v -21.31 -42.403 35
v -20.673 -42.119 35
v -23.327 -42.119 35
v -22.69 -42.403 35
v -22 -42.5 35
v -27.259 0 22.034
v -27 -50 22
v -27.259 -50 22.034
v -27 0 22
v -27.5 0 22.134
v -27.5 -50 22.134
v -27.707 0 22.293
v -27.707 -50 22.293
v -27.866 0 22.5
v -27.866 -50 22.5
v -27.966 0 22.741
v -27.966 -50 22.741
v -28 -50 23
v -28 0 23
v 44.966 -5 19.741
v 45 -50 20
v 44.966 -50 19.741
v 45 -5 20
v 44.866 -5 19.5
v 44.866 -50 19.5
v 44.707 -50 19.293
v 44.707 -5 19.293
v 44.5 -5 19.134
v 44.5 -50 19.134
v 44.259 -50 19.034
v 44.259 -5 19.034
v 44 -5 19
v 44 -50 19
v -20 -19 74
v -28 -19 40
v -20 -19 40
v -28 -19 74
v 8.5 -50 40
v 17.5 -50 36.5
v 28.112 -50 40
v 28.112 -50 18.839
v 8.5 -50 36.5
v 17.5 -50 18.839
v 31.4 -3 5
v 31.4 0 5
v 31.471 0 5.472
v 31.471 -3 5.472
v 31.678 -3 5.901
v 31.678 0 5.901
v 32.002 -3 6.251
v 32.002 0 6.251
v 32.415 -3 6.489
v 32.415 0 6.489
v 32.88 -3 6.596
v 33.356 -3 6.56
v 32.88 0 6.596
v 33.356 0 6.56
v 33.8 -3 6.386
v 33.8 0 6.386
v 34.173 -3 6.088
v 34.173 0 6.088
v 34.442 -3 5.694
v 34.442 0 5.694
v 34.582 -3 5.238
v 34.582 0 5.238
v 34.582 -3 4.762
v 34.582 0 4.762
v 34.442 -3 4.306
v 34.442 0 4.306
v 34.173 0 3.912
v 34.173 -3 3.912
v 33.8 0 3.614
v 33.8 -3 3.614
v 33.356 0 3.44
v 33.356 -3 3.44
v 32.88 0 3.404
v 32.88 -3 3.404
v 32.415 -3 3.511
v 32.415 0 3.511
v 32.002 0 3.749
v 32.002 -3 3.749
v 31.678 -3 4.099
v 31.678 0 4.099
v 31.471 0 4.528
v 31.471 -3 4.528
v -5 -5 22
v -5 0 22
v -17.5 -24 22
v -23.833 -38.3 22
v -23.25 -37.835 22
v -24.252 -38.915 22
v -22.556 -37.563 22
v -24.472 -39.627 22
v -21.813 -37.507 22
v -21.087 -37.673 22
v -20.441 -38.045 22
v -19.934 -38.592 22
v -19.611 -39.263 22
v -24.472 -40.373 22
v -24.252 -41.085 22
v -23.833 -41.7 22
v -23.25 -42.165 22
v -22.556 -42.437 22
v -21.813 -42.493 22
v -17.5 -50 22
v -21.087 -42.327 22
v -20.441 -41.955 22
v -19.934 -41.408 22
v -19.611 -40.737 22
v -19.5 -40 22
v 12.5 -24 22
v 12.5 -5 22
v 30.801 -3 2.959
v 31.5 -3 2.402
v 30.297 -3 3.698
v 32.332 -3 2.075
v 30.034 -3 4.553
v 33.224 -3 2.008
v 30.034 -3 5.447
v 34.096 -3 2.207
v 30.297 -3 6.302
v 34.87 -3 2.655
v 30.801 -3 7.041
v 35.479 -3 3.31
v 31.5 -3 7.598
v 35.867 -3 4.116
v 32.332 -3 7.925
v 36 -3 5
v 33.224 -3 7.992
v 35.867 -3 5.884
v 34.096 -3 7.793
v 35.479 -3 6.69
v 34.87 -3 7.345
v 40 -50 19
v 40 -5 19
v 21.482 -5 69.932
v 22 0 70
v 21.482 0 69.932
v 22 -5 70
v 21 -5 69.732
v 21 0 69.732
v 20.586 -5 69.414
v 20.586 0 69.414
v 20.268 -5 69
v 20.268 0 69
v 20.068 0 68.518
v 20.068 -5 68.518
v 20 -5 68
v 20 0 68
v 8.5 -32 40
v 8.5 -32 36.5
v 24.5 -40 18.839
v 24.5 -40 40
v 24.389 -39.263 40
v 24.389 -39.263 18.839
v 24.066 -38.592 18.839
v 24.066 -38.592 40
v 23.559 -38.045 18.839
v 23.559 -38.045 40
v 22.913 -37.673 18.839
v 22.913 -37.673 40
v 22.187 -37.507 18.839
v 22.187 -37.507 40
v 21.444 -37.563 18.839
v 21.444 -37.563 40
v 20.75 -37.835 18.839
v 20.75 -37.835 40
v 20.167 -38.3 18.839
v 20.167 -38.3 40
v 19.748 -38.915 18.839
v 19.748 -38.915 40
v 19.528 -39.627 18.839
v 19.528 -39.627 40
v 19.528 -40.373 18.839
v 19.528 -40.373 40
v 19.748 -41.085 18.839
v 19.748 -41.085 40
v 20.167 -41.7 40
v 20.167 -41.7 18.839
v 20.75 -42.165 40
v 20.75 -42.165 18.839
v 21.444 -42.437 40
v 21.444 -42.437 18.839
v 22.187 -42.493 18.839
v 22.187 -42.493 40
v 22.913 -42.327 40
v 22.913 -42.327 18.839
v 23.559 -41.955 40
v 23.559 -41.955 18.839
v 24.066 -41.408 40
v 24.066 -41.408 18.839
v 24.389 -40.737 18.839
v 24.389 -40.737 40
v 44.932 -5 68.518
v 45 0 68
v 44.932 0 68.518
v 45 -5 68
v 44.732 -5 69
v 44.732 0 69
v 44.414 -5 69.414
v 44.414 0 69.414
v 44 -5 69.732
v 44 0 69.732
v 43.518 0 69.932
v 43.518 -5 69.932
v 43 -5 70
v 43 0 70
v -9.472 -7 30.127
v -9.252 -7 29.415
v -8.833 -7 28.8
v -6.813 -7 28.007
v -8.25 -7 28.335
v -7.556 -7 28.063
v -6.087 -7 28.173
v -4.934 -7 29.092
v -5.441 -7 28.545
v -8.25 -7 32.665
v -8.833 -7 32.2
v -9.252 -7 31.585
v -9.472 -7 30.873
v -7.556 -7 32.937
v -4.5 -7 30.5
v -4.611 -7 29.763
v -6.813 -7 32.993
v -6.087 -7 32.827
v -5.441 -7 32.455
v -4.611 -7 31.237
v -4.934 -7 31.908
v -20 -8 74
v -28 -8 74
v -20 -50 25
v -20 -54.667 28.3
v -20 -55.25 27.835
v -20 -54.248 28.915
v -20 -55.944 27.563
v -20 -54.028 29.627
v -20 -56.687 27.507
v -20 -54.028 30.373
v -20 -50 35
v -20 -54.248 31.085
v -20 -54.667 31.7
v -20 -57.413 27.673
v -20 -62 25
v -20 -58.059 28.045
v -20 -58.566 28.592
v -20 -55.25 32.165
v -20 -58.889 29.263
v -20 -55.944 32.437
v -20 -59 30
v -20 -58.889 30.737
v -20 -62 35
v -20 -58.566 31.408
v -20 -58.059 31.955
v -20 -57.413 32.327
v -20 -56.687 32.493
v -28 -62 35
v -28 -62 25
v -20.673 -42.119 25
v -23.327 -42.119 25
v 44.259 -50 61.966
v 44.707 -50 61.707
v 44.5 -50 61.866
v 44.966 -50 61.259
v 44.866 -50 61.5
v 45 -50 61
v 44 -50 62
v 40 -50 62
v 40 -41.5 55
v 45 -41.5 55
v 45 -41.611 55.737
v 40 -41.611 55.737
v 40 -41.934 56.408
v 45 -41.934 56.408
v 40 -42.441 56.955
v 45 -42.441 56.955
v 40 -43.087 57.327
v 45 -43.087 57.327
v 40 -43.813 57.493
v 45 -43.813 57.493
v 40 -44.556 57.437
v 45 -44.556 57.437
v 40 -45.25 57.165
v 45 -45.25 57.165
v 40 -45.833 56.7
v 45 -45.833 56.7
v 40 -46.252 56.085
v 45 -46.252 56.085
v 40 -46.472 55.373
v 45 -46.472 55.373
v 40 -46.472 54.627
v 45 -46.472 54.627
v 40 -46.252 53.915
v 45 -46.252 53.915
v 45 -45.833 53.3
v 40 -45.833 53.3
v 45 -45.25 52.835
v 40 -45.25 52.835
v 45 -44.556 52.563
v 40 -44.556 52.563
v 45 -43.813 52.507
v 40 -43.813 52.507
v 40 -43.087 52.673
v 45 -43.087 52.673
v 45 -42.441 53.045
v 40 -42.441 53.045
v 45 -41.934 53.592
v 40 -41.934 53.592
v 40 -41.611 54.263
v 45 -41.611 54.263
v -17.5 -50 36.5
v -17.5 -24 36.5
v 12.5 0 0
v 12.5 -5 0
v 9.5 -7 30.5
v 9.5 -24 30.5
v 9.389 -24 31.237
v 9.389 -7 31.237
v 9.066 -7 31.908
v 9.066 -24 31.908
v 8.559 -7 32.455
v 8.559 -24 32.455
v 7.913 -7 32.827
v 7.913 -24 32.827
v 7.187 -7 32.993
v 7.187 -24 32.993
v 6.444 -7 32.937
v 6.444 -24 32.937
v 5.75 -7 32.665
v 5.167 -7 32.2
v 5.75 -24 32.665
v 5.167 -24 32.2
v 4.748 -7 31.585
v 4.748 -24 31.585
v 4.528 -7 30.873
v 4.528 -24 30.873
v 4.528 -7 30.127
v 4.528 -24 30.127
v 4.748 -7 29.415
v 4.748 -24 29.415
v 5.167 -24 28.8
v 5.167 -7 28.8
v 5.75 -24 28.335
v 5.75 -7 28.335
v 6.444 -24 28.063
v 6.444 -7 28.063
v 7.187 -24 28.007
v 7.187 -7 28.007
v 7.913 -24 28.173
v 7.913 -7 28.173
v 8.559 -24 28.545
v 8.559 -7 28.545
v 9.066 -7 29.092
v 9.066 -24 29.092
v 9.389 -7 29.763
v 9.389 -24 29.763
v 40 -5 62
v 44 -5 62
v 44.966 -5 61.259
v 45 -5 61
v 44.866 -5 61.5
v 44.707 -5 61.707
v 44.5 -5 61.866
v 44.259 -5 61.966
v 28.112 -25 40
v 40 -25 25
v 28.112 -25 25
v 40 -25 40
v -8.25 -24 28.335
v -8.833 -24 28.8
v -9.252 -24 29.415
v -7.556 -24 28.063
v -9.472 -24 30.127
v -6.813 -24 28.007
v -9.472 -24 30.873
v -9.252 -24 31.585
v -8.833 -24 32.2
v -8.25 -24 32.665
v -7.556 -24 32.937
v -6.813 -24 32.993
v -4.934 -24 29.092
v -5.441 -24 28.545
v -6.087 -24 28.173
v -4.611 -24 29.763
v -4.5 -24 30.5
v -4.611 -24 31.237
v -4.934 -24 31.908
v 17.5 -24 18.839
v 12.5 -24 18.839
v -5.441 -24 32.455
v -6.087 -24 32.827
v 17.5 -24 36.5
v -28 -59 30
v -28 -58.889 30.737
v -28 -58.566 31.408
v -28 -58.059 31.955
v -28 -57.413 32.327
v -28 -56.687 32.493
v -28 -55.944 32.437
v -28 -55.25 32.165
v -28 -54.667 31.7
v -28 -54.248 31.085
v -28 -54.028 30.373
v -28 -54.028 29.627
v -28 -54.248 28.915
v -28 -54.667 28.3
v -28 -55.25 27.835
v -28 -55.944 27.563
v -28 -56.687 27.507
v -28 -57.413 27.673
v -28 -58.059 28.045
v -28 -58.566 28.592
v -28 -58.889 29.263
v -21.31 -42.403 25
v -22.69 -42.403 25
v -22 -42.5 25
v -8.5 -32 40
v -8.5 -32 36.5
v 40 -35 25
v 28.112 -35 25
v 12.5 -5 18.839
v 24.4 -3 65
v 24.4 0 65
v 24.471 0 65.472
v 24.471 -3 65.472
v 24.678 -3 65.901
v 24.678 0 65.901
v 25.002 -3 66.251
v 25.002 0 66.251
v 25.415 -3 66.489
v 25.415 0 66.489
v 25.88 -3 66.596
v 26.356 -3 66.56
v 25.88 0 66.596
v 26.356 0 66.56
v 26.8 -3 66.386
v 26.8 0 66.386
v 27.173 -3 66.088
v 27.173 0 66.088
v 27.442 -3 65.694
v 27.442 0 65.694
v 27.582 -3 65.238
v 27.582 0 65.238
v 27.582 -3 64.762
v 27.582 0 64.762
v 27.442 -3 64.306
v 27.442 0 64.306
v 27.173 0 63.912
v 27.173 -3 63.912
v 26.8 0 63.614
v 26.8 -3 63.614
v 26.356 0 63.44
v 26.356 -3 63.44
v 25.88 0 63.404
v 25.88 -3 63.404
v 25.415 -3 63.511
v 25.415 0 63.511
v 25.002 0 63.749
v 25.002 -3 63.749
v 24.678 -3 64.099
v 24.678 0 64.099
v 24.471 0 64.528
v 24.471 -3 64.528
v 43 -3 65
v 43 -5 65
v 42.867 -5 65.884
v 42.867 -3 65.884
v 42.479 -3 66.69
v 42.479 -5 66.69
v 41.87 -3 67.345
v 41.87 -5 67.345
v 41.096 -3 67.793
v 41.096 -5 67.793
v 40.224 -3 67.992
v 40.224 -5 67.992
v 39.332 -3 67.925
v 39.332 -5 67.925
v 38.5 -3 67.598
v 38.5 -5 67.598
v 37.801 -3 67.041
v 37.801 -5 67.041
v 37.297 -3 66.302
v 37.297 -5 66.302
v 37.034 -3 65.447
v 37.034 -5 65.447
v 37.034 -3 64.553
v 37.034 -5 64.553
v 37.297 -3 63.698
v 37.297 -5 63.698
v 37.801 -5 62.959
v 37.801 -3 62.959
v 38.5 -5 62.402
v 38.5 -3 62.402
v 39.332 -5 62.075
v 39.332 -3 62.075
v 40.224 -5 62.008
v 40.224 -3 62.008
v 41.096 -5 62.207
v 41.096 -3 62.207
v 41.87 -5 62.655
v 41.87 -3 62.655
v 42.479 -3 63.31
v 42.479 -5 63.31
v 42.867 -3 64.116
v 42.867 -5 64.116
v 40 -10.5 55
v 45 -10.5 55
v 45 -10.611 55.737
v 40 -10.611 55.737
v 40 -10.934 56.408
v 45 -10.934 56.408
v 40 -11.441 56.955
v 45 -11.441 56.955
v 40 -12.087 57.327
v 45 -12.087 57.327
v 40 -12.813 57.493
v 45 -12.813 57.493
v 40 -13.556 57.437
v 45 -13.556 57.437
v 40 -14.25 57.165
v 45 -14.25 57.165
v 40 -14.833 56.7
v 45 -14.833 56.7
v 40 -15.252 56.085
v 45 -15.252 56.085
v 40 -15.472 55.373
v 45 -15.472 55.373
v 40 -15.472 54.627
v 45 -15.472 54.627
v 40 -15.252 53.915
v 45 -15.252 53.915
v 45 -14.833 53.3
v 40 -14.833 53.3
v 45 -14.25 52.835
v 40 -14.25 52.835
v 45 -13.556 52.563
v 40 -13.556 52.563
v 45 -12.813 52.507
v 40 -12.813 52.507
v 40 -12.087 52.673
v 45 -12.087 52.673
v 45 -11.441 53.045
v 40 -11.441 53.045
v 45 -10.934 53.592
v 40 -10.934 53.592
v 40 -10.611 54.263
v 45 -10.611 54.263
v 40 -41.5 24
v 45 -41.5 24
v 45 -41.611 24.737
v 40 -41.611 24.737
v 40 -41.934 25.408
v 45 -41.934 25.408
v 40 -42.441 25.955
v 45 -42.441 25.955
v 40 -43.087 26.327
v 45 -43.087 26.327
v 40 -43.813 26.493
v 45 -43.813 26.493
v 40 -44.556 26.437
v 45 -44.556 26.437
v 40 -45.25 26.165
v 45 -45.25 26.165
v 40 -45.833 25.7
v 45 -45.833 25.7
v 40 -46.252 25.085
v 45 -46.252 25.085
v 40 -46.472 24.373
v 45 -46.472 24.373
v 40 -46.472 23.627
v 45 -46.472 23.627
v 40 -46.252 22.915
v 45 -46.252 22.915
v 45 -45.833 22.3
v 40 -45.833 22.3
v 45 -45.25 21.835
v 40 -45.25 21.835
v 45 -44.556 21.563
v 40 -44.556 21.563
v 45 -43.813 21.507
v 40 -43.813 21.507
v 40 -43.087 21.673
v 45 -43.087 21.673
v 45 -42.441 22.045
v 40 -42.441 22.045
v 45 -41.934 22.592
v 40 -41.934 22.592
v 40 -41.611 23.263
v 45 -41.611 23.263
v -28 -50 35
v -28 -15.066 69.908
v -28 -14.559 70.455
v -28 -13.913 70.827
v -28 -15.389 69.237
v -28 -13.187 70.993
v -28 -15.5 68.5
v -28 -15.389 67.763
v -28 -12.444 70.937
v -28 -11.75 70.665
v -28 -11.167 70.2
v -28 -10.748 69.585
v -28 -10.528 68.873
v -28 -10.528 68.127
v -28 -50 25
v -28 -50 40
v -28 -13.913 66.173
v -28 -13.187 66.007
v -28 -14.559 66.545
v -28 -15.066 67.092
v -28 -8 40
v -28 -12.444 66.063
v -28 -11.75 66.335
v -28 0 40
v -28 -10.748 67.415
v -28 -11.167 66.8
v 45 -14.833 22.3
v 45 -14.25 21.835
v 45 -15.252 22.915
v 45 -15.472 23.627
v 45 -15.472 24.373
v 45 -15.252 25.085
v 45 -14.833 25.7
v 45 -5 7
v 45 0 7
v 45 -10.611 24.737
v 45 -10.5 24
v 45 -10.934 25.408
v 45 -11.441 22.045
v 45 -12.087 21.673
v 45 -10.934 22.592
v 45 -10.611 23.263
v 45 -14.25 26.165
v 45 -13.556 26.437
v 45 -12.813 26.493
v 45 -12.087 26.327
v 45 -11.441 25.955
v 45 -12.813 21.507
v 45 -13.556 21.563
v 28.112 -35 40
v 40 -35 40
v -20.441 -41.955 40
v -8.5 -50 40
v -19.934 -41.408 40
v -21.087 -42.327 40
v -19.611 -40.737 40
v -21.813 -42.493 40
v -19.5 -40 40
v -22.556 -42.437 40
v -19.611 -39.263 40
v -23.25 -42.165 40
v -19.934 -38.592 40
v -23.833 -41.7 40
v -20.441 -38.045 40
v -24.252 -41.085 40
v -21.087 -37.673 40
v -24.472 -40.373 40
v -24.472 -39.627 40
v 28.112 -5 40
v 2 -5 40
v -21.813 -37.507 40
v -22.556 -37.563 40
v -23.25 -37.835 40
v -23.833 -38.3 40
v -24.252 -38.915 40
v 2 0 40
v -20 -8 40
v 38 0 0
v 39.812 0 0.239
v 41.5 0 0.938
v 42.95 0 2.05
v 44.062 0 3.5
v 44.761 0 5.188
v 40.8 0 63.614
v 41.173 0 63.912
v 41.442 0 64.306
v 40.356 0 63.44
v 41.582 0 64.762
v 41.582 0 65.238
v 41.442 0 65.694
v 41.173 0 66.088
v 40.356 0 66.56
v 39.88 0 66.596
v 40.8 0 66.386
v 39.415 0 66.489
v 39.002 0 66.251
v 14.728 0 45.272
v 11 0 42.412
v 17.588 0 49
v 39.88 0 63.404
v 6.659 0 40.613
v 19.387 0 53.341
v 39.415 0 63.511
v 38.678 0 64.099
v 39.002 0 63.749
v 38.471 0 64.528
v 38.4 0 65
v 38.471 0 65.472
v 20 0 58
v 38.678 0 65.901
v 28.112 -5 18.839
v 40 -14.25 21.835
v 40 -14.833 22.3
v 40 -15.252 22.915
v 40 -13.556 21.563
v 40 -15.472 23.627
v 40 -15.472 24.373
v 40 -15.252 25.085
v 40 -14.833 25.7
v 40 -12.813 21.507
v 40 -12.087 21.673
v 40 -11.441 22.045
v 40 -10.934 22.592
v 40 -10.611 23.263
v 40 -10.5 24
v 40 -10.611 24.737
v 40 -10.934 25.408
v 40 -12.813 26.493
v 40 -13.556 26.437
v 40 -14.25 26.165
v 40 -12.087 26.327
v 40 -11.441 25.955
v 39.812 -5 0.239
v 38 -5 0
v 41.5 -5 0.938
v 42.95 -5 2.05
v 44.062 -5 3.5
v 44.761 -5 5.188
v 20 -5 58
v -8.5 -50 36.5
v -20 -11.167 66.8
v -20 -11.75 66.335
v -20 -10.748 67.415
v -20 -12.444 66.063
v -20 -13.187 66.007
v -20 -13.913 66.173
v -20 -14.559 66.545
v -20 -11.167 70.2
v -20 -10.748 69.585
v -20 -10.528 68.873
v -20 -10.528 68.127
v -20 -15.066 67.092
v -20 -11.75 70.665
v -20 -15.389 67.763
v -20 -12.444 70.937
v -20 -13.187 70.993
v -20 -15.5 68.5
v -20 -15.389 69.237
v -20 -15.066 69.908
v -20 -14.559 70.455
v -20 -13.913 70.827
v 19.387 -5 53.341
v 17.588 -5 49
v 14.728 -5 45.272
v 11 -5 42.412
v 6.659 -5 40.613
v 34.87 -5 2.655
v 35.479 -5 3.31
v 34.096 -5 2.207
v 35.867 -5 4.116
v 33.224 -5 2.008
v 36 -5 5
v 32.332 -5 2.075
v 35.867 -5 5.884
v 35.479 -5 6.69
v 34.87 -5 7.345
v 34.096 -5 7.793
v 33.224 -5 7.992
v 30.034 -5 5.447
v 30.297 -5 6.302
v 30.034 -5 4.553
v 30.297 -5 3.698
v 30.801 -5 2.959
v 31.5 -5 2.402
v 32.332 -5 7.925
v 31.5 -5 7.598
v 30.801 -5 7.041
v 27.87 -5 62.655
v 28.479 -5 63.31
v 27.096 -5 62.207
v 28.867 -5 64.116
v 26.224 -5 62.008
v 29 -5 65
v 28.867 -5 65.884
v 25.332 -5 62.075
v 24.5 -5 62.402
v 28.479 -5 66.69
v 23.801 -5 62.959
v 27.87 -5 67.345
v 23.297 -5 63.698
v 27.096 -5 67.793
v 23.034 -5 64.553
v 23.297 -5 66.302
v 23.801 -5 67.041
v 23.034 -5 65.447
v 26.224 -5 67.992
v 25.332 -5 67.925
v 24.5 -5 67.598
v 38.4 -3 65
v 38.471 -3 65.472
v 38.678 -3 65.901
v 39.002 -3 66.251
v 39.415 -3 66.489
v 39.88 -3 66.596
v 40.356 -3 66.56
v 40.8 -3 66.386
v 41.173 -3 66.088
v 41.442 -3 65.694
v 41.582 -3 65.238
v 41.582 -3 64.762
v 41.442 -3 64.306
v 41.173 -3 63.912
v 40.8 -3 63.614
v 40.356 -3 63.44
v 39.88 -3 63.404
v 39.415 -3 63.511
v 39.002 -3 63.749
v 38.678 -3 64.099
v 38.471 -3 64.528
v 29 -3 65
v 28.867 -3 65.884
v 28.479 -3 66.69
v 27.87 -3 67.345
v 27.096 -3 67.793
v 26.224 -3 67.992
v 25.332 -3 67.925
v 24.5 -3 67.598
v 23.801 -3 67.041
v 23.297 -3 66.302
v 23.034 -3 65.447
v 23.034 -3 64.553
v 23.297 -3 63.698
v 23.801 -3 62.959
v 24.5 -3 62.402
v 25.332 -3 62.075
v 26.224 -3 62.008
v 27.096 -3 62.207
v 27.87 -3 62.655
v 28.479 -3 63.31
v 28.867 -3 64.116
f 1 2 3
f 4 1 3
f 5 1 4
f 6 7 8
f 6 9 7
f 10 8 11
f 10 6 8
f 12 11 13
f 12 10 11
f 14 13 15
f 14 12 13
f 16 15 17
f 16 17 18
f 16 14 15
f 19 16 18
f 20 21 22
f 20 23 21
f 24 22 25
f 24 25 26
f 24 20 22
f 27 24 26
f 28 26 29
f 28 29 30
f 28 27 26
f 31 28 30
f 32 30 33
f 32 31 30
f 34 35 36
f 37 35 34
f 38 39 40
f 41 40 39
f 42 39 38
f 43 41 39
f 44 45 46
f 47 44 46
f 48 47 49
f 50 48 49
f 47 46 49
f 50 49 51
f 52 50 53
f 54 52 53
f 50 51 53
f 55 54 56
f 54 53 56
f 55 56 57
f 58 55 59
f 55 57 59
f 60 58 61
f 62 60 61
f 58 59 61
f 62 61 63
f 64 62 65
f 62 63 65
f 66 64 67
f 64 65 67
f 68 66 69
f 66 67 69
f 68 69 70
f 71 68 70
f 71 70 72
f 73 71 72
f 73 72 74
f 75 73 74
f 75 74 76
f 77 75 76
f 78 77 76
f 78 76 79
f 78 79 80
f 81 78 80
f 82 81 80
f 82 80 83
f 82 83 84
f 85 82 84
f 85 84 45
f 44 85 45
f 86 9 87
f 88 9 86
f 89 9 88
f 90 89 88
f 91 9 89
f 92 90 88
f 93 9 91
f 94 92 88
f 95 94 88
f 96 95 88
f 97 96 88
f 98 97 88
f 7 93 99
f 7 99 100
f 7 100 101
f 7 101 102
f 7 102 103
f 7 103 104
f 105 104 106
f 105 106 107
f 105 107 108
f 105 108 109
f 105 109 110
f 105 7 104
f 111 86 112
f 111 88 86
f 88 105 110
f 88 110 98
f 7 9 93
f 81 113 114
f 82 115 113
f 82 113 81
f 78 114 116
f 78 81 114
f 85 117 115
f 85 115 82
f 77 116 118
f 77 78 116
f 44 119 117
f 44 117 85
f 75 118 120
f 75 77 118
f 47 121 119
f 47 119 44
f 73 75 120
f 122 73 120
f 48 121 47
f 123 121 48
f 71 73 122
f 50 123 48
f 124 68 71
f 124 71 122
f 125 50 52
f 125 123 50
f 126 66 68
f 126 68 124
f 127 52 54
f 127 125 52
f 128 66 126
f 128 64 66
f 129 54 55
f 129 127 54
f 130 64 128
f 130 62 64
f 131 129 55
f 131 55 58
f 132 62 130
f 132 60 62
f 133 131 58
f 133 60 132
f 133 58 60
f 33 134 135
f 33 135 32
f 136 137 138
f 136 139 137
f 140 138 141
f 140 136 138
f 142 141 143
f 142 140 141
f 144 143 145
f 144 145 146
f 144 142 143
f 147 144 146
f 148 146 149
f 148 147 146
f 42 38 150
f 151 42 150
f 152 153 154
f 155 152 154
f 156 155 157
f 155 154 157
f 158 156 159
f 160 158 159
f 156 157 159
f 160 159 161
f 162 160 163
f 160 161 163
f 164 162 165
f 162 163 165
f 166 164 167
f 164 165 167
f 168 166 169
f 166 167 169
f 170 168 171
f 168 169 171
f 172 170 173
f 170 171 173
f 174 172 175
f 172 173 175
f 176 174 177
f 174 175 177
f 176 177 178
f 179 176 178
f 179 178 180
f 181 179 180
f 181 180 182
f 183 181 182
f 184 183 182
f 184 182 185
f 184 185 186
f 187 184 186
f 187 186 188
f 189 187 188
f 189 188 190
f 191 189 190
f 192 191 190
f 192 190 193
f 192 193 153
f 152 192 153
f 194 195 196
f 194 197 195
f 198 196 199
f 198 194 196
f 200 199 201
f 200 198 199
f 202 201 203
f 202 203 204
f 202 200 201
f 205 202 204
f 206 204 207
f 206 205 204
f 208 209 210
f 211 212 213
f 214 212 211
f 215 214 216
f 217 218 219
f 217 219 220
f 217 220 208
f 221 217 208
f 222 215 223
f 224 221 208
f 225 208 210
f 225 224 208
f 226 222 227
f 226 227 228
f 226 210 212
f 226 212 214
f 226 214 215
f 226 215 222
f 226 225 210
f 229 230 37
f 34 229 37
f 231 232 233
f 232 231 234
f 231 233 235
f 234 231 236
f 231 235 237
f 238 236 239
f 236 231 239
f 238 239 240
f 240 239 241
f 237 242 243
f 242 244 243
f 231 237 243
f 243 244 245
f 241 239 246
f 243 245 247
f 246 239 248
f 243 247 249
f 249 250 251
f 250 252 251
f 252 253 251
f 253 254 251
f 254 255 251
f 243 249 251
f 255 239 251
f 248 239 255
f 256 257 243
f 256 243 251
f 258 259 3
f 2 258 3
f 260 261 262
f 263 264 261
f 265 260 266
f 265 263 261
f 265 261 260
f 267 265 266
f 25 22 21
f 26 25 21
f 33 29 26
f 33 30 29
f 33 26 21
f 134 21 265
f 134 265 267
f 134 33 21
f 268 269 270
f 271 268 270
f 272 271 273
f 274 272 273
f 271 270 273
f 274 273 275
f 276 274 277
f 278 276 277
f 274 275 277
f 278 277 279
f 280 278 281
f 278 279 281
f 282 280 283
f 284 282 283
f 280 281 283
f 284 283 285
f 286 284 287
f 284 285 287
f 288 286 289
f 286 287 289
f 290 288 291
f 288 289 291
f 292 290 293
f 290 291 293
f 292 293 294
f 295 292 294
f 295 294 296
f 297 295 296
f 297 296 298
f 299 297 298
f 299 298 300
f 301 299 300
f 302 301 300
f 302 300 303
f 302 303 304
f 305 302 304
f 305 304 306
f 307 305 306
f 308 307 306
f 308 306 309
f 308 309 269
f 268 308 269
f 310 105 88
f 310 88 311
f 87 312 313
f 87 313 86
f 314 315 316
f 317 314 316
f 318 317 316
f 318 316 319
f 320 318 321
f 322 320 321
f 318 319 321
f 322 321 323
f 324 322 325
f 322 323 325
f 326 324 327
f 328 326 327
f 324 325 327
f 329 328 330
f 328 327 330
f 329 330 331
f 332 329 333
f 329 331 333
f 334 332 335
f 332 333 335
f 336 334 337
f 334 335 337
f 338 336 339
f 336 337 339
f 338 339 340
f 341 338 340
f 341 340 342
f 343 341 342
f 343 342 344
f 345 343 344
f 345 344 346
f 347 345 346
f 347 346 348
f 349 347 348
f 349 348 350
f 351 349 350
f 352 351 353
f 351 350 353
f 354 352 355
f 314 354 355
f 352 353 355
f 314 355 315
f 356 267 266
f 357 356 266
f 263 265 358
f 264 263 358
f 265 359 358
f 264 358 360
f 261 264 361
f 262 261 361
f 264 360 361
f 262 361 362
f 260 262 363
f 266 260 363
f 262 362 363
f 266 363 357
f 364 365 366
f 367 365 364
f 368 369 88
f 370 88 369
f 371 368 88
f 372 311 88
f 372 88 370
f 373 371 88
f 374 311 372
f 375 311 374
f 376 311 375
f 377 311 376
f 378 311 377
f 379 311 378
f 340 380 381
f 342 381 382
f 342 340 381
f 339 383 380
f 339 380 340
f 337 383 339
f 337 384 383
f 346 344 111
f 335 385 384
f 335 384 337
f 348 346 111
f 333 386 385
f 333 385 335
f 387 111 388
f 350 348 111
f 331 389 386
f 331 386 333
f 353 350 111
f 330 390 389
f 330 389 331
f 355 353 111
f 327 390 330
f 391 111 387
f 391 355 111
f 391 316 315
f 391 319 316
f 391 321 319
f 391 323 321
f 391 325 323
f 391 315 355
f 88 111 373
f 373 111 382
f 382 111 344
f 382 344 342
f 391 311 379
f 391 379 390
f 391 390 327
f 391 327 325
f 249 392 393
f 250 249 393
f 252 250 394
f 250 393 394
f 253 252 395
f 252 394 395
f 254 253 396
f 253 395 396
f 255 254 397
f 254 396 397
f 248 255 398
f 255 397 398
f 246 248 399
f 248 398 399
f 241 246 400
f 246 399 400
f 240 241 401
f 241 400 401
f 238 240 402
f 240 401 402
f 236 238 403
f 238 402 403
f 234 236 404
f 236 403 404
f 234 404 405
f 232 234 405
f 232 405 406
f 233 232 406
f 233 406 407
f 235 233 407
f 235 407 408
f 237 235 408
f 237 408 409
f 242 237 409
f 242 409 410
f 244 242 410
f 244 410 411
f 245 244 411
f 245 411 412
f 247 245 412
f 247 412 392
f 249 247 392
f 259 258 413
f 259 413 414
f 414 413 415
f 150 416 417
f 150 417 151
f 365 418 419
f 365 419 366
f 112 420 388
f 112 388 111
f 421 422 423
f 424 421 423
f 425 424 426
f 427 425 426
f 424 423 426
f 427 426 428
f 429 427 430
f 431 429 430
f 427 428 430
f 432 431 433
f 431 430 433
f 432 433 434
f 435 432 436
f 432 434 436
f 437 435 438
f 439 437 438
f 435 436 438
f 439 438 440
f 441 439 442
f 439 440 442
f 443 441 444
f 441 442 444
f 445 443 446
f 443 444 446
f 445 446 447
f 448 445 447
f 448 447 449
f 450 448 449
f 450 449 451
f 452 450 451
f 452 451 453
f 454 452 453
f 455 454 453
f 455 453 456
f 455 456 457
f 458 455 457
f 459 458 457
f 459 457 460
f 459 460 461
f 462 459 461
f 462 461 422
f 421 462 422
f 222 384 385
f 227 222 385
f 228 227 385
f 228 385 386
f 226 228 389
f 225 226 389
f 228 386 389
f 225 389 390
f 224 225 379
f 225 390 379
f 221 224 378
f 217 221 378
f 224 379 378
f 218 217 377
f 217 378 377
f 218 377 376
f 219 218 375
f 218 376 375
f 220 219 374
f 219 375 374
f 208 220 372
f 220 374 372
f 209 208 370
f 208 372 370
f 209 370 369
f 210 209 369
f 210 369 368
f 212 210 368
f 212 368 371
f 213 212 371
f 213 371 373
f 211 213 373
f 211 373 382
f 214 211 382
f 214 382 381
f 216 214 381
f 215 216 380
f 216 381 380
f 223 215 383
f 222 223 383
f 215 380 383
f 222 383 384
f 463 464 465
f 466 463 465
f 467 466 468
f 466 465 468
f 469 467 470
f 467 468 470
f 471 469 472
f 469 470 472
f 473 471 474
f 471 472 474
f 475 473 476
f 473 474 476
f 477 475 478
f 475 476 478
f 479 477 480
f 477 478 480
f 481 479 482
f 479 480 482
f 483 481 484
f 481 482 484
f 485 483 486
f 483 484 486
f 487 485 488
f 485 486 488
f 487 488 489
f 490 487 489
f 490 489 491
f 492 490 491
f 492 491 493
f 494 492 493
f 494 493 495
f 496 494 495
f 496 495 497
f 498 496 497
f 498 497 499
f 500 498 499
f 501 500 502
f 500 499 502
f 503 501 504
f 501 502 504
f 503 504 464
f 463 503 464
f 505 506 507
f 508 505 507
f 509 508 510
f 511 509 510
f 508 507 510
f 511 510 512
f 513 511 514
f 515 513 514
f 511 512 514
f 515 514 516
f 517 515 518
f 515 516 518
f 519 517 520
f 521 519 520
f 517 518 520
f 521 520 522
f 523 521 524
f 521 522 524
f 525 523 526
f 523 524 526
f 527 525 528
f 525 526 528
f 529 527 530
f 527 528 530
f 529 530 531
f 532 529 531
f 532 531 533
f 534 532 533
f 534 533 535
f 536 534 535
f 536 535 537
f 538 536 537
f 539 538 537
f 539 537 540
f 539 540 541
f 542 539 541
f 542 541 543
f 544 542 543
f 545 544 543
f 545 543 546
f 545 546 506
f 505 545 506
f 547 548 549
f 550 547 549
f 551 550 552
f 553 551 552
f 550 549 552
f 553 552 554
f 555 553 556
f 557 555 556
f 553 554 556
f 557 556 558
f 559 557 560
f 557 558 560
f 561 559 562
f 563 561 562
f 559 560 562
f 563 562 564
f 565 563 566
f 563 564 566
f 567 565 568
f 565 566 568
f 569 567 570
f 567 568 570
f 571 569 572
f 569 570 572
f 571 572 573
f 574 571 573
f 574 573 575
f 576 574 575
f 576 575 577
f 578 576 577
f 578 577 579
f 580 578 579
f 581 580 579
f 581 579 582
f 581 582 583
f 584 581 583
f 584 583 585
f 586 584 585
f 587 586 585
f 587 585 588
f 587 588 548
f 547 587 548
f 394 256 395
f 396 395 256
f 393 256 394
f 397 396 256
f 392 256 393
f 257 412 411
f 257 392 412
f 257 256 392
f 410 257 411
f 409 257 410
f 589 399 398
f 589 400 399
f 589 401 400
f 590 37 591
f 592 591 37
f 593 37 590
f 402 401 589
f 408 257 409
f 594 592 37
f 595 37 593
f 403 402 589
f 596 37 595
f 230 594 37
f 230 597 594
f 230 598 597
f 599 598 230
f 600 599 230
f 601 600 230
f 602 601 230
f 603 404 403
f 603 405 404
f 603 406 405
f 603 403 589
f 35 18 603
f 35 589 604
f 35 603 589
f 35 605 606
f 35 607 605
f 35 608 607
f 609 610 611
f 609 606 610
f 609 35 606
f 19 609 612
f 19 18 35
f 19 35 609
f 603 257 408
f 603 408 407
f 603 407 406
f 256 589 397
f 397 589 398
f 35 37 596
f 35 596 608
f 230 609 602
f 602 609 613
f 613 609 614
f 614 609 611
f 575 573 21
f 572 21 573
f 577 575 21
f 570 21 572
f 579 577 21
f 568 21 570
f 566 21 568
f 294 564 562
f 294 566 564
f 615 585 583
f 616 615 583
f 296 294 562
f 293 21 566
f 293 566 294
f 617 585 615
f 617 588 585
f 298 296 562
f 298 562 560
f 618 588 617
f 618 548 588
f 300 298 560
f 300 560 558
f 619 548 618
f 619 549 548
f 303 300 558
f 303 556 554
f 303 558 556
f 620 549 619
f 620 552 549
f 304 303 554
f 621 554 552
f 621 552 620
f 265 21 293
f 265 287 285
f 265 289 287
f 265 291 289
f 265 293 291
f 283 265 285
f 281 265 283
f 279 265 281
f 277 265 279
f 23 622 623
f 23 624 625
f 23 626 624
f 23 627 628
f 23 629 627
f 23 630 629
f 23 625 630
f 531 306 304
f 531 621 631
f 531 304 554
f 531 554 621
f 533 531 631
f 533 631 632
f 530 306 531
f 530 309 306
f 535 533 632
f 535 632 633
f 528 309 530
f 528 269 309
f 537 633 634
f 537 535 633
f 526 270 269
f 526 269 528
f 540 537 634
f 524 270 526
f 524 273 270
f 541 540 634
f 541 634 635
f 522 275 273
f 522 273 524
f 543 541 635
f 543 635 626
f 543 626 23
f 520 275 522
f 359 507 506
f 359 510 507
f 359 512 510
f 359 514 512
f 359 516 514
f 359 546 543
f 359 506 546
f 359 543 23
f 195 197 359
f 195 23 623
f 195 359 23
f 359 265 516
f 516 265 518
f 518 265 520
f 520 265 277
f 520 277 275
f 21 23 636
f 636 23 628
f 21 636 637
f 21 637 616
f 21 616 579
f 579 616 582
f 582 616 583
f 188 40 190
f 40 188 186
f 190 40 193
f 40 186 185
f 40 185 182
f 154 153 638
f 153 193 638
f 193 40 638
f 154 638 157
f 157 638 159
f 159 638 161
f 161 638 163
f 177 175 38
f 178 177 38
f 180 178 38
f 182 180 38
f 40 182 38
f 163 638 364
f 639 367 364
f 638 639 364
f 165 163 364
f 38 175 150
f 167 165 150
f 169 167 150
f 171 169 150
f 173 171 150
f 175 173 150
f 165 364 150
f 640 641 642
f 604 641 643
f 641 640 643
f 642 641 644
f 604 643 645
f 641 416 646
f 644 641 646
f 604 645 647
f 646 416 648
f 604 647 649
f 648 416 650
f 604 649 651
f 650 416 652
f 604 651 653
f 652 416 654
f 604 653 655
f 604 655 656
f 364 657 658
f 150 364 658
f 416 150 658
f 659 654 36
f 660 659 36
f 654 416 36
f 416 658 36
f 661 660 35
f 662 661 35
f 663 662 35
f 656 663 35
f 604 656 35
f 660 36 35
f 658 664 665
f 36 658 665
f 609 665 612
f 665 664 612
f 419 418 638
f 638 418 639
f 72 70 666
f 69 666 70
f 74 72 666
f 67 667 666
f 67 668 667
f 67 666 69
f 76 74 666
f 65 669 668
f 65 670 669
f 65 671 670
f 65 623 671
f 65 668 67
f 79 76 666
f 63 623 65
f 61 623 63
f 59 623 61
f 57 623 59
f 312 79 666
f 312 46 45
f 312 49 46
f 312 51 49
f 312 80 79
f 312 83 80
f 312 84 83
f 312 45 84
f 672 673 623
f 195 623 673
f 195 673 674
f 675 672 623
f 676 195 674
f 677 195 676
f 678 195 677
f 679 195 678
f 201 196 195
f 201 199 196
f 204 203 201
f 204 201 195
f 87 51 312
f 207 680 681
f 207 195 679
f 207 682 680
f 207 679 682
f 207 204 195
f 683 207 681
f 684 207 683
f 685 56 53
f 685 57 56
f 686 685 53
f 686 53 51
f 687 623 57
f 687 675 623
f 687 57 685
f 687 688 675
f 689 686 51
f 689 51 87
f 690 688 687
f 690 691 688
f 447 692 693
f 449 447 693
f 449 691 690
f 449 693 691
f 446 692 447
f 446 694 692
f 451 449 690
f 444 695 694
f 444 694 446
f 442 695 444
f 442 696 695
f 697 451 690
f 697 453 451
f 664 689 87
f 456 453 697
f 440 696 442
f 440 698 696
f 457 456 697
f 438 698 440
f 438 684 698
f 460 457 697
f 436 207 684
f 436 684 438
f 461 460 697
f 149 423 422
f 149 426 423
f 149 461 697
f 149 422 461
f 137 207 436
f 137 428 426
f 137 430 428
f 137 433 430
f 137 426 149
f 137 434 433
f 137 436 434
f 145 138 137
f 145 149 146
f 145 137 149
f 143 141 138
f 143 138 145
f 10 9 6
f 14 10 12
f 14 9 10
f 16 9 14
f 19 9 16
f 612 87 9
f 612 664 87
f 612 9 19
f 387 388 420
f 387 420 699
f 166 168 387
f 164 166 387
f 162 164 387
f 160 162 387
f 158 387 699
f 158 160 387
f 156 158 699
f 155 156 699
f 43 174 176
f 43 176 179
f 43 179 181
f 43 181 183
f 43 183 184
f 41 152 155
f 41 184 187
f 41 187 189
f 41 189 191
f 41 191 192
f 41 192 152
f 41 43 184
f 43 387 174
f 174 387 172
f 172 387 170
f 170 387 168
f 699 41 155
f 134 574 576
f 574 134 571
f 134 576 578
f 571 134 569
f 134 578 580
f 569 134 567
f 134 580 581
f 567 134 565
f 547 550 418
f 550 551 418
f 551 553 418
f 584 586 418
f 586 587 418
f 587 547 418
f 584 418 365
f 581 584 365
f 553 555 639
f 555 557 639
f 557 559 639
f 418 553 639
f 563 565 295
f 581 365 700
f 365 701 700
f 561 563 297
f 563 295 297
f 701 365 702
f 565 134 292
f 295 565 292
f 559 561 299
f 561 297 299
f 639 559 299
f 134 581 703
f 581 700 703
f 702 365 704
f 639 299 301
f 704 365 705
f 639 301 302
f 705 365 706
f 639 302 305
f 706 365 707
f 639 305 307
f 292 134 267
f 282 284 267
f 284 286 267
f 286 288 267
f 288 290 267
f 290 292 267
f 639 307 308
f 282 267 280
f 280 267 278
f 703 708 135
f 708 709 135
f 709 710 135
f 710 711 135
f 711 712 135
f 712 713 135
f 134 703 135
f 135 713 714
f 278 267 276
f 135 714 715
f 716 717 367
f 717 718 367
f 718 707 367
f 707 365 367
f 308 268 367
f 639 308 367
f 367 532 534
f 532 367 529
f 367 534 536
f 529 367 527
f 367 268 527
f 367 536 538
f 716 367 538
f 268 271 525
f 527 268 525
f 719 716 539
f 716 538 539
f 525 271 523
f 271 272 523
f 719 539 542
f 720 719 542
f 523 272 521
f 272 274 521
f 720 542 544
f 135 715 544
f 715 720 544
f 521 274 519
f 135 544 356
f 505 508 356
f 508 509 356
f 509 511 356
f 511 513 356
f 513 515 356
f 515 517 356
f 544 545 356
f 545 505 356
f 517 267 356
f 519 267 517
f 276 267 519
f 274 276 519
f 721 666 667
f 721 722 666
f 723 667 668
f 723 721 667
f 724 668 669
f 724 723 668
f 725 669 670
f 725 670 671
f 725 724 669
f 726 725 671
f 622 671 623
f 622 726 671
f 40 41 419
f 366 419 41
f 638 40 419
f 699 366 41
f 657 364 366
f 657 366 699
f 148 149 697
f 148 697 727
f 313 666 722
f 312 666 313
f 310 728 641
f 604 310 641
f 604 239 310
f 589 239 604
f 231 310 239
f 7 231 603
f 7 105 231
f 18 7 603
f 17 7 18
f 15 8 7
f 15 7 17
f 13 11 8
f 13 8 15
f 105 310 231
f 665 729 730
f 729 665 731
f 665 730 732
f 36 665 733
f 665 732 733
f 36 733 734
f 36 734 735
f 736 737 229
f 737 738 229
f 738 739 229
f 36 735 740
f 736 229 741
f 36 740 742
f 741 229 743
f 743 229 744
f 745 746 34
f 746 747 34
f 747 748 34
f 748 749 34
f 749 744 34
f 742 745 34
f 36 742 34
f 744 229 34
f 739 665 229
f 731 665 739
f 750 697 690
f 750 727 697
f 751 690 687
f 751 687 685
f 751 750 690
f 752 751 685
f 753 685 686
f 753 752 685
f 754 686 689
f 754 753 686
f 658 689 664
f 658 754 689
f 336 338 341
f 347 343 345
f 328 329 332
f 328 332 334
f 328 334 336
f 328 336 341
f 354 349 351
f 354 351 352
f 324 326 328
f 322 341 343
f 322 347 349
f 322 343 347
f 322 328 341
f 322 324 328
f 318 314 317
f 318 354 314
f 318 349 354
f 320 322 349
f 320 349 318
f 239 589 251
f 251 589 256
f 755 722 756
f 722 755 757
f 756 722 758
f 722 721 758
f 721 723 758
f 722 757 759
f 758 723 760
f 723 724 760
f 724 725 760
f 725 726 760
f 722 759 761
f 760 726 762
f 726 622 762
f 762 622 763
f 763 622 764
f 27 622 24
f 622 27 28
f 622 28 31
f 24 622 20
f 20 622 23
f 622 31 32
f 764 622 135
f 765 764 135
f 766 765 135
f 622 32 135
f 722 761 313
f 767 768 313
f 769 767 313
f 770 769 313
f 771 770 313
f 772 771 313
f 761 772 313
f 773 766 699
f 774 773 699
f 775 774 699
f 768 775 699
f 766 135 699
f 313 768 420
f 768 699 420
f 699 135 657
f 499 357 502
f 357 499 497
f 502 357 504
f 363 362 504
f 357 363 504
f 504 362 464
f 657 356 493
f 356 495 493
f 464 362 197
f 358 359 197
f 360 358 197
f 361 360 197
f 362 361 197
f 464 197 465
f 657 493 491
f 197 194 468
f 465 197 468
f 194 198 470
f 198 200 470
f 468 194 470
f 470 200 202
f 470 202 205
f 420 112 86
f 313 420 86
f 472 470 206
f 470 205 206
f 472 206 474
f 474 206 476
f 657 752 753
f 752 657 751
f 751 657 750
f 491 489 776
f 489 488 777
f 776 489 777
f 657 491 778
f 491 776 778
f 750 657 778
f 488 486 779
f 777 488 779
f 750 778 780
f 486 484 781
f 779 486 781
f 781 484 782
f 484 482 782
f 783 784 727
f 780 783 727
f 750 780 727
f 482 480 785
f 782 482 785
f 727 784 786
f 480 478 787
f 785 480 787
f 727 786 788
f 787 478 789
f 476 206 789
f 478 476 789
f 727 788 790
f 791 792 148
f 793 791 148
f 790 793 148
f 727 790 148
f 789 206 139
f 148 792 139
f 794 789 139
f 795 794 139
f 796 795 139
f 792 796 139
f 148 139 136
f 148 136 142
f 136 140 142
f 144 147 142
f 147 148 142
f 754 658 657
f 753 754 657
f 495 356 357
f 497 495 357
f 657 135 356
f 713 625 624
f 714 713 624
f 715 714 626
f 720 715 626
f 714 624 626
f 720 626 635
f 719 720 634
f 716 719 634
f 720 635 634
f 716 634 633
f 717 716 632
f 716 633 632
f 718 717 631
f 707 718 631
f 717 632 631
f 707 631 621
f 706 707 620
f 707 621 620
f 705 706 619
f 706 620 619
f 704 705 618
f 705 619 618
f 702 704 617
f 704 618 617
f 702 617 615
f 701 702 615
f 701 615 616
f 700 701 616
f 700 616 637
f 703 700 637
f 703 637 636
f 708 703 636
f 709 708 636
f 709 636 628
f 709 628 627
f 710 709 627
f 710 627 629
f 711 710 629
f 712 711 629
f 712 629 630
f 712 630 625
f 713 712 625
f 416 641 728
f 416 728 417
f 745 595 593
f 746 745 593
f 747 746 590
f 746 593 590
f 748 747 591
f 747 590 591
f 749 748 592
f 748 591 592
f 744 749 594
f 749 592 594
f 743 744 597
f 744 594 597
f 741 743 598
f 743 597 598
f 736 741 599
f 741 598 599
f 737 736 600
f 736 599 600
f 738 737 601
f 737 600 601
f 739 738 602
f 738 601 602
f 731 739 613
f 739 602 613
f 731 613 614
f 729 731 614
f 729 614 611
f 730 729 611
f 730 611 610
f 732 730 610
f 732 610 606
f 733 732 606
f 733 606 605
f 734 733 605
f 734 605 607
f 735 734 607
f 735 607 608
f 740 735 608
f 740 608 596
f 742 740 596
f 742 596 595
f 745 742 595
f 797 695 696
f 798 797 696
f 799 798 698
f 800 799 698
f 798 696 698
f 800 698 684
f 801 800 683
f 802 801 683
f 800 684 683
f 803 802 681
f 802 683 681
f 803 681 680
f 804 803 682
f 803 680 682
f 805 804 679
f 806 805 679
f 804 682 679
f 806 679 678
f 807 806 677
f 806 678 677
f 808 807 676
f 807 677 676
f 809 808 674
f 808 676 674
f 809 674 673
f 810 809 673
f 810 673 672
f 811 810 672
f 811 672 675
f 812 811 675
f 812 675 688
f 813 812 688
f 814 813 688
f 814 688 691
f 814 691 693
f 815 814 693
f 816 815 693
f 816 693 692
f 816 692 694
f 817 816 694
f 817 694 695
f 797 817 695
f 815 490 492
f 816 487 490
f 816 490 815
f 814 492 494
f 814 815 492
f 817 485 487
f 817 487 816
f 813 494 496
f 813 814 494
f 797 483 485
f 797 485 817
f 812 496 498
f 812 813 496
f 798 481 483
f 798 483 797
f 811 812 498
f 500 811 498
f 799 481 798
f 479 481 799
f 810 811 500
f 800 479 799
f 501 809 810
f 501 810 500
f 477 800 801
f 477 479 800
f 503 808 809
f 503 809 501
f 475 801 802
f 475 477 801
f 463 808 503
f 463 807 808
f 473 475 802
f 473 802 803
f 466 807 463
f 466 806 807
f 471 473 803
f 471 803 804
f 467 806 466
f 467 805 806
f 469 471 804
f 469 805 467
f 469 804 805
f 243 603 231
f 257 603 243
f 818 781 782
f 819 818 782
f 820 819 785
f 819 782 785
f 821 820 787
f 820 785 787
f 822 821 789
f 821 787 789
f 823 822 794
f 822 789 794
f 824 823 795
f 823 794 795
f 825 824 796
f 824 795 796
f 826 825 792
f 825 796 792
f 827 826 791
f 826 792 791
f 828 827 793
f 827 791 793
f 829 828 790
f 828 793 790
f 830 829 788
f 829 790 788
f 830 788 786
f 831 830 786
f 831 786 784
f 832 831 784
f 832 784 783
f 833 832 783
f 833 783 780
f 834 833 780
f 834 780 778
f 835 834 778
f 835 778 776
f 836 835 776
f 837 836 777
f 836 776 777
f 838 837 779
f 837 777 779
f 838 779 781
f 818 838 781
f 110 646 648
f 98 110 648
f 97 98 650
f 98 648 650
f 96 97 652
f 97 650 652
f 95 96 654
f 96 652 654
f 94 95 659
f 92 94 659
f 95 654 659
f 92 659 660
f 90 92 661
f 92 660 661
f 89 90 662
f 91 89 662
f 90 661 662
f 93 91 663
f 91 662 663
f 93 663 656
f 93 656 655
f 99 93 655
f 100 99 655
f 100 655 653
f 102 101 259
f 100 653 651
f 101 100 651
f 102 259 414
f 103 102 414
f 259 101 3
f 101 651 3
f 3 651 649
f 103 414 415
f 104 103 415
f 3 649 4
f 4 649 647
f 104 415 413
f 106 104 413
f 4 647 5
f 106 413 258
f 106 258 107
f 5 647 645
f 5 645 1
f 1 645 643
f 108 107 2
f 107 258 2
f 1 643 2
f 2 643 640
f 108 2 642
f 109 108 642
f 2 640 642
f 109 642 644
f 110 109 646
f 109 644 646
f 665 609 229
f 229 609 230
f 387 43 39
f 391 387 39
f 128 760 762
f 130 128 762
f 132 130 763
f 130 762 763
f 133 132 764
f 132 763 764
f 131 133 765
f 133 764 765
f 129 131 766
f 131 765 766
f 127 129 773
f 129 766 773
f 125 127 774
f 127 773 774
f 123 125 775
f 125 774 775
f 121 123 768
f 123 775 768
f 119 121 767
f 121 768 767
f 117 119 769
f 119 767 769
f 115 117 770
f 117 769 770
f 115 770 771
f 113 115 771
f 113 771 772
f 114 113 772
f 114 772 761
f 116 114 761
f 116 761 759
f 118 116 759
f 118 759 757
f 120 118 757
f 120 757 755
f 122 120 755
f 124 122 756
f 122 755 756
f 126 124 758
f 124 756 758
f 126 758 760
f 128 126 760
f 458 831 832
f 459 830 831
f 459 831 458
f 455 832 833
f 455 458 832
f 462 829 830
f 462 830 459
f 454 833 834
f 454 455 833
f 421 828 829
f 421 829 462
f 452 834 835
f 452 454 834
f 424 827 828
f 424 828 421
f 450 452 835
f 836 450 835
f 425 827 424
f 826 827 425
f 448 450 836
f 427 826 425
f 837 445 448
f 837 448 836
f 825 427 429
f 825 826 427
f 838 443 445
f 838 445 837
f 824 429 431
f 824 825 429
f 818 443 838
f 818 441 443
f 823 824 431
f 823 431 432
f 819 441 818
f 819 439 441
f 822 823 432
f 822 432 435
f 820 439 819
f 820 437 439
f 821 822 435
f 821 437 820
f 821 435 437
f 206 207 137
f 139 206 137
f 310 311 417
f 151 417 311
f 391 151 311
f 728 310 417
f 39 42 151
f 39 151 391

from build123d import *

# Parameters (mm, degrees)
PAD_DEPTH            = 70
SKETCH001_W          = 11.887794
SKETCH001_H          = 46.78
POCKET_DEPTH         = 70.001
POCKET001_DEPTH      = 30
SKETCH003_R          = 2.5
POCKET002_DEPTH      = 40.001
SKETCH004_W          = 17
SKETCH004_H          = 23.314381
POCKET003_DEPTH      = 40.001
SKETCH005_W          = 35
SKETCH005_H          = 57.974789
POCKET004_DEPTH      = 26
SKETCH006_W          = 45.255611
SKETCH006_H          = 30.428207
POCKET005_DEPTH      = 28
POCKET005_DEPTH_BACK = -100
SKETCH007_W          = 26.242121
SKETCH007_H          = 29.741062
POCKET006_DEPTH      = 45
SKETCH008_W          = 15.625622
SKETCH008_H          = 14.392597
SKETCH008_W_2        = 24.610352
SKETCH008_H_2        = 31.67345
POCKET007_DEPTH      = 45
SKETCH009_R          = 2.5
POCKET008_DEPTH      = 13
SKETCH010_R          = 1.6
POCKET009_DEPTH      = 5
SKETCH014_W          = 10
SKETCH014_H          = 15
PAD001_DEPTH         = 23
SKETCH015_W          = 11
SKETCH015_H          = 38.184422
SKETCH015_W_2        = 19.881198
SKETCH015_H_2        = 10
PAD002_DEPTH         = 8
SKETCH013_R          = 2.5
POCKET010_DEPTH      = 17
SKETCH011_R          = 2.5
POCKET011_DEPTH      = 15
PAD003_DEPTH         = 5
SKETCH017_R          = 3
POCKET012_DEPTH      = 2
FILLET_R             = 1
FILLET001_R          = 7
FILLET002_R          = 1
FILLET003_R          = 1
FILLET004_R          = 2
FILLET005_R          = 2
FILLET006_R          = 18


with BuildPart() as part:
    # Sketch → Pad (new body)
    with BuildSketch(Plane.XY):
        Polygon((0, 0), (45, 0), (45, -50), (-28, -50), (-28, 0), align=None)
    extrude(amount=PAD_DEPTH)

    # Sketch001 (on Face7 of Pad) → Pocket (cut, through all)
    with BuildSketch(Plane.XY.offset(70)):
        with Locations((34.056103, -28.39)):
            Rectangle(SKETCH001_W, SKETCH001_H)
    extrude(amount=-POCKET_DEPTH, mode=Mode.SUBTRACT)

    # Sketch002 (on Face5 of Pocket) → Pocket001 (cut)
    with BuildSketch(Plane.XY.offset(70)):
        Polygon((30, -5), (30, -65.096024), (-40.783405, -65.096024), (-40.783405, 12.994774), (20, 12.994774), (20, -5), align=None)
    extrude(amount=-POCKET001_DEPTH, mode=Mode.SUBTRACT)

    # Sketch003 (on Face6 of Pocket001) → Pocket002 (cut, through all)
    with BuildSketch(Plane.XY.offset(40)):
        with Locations((-22, -40)):
            Circle(SKETCH003_R)
        with Locations((22, -40)):
            Circle(SKETCH003_R)
    extrude(amount=-POCKET002_DEPTH, mode=Mode.SUBTRACT)

    # Sketch004 (on Face6 of Pocket002) → Pocket003 (cut, through all)
    with BuildSketch(Plane.XY.offset(40)):
        with Locations((0, -43.65719)):
            Rectangle(SKETCH004_W, SKETCH004_H)
    extrude(amount=-POCKET003_DEPTH, mode=Mode.SUBTRACT)

    # Sketch005 (on Face13 of Pocket003) → Pocket004 (cut)
    with BuildSketch(Plane.XZ.offset(50)):
        with Locations((0, 7.512606)):
            Rectangle(SKETCH005_W, SKETCH005_H)
    extrude(amount=-POCKET004_DEPTH, mode=Mode.SUBTRACT)

    # Sketch006 (on Face11 of Pocket004) → Pocket005 (cut, two sides)
    with BuildSketch(Plane.XZ.offset(24)) as pocket005_sk:
        with Locations((-10.127806, 6.785896)):
            Rectangle(SKETCH006_W, SKETCH006_H)
    extrude(amount=-POCKET005_DEPTH, mode=Mode.SUBTRACT)
    extrude(pocket005_sk.sketch, amount=-POCKET005_DEPTH_BACK, mode=Mode.SUBTRACT)

    # Sketch007 (on Face12 of Pocket005) → Pocket006 (cut)
    with BuildSketch(Plane.XZ.offset(50)):
        with Locations((20.733142, 3.968048)):
            Rectangle(SKETCH007_W, SKETCH007_H)
    extrude(amount=-POCKET006_DEPTH, mode=Mode.SUBTRACT)

    # Sketch008 (on Face14 of Pocket006) → Pocket007 (cut)
    with BuildSketch(Plane.XZ.offset(50)):
        with Locations((42.909006, 69.196298)):
            Rectangle(SKETCH008_W, SKETCH008_H)
        with Locations((46.359665, 3.163275)):
            Rectangle(SKETCH008_W_2, SKETCH008_H_2)
    extrude(amount=-POCKET007_DEPTH, mode=Mode.SUBTRACT)

    # Sketch009 (on Face3 of Pocket007) → Pocket008 (cut)
    with BuildSketch(Plane.YZ.offset(45)):
        with Locations((-44, 55)):
            Circle(SKETCH009_R)
        with Locations((-13, 24)):
            Circle(SKETCH009_R)
        with Locations((-13, 55)):
            Circle(SKETCH009_R)
        with Locations((-44, 24)):
            Circle(SKETCH009_R)
    extrude(amount=-POCKET008_DEPTH, mode=Mode.SUBTRACT)

    # Sketch010 (on Face1 of Pocket008) → Pocket009 (cut)
    with BuildSketch(Plane(origin=(0, 0, 0), x_dir=(-1, 0, 0), z_dir=(0, 1, 0))):
        with Locations((-33, 5)):
            Circle(SKETCH010_R)
        with Locations((-40, 65)):
            Circle(SKETCH010_R)
        with Locations((-26, 65)):
            Circle(SKETCH010_R)
    extrude(amount=-POCKET009_DEPTH, mode=Mode.SUBTRACT)

    # Sketch014 (on Face4 of Pocket009) → Pad001 (join)
    with BuildSketch(Plane.YZ.offset(45)):
        with Locations((-30, 32.5)):
            Rectangle(SKETCH014_W, SKETCH014_H)
    extrude(amount=-PAD001_DEPTH)

    # Sketch015 (on Face29 of Pad001) → Pad002 (join)
    with BuildSketch(Plane(origin=(-28, 0, 0), x_dir=(0, -1, 0), z_dir=(-1, 0, 0))):
        with Locations((13.5, 54.907789)):
            Rectangle(SKETCH015_W, SKETCH015_H)
        with Locations((52.059401, 30)):
            Rectangle(SKETCH015_W_2, SKETCH015_H_2)
    extrude(amount=-PAD002_DEPTH)

    # Sketch013 (on Face19 of Pad002) → Pocket010 (cut)
    with BuildSketch(Plane.XZ.offset(24)):
        with Locations((-7, 30.5)):
            Circle(SKETCH013_R)
        with Locations((7, 30.5)):
            Circle(SKETCH013_R)
    extrude(amount=-POCKET010_DEPTH, mode=Mode.SUBTRACT)

    # Sketch011 (on Face29 of Pad002) → Pocket011 (cut)
    with BuildSketch(Plane(origin=(-28, 0, 0), x_dir=(0, -1, 0), z_dir=(-1, 0, 0))):
        with Locations((56.5, 30)):
            Circle(SKETCH011_R)
        with Locations((13, 68.5)):
            Circle(SKETCH011_R)
    extrude(amount=-POCKET011_DEPTH, mode=Mode.SUBTRACT)

    # Sketch016 (on Face1 of Pocket011) → Pad003 (join)
    with BuildSketch(Plane(origin=(0, 0, 0), x_dir=(-1, 0, 0), z_dir=(0, 1, 0))):
        Polygon((-12.5, 0), (5, 22), (-15.71, 22), align=None)
    extrude(amount=-PAD003_DEPTH)

    # Sketch017 (on Face28 of Pad003) → Pocket012 (cut)
    with BuildSketch(Plane.XZ.offset(5)):
        with Locations((26, 65)):
            Circle(SKETCH017_R)
        with Locations((33, 5)):
            Circle(SKETCH017_R)
        with Locations((40, 65)):
            Circle(SKETCH017_R)
    extrude(amount=-POCKET012_DEPTH, mode=Mode.SUBTRACT)

    # Fillet
    fillet_edges = [part.edges().sort_by_distance(p)[0] for p in [
        (-28, -25, 22),
    ]]
    fillet(fillet_edges, radius=FILLET_R)

    # Fillet001
    fillet001_edges = [part.edges().sort_by_distance(p)[0] for p in [
        (45, -2.5, 0),
    ]]
    fillet(fillet001_edges, radius=FILLET001_R)

    # Fillet002
    fillet002_edges = [part.edges().sort_by_distance(p)[0] for p in [
        (45, -27.5, 19),
    ]]
    fillet(fillet002_edges, radius=FILLET002_R)

    # Fillet003
    fillet003_edges = [part.edges().sort_by_distance(p)[0] for p in [
        (45, -27.5, 62),
    ]]
    fillet(fillet003_edges, radius=FILLET003_R)

    # Fillet004
    fillet004_edges = [part.edges().sort_by_distance(p)[0] for p in [
        (45, -2.5, 70),
    ]]
    fillet(fillet004_edges, radius=FILLET004_R)

    # Fillet005
    fillet005_edges = [part.edges().sort_by_distance(p)[0] for p in [
        (20, -2.5, 70),
    ]]
    fillet(fillet005_edges, radius=FILLET005_R)

    # Fillet006
    fillet006_edges = [part.edges().sort_by_distance(p)[0] for p in [
        (20, -2.5, 40),
    ]]
    fillet(fillet006_edges, radius=FILLET006_R)


solid = part.part
